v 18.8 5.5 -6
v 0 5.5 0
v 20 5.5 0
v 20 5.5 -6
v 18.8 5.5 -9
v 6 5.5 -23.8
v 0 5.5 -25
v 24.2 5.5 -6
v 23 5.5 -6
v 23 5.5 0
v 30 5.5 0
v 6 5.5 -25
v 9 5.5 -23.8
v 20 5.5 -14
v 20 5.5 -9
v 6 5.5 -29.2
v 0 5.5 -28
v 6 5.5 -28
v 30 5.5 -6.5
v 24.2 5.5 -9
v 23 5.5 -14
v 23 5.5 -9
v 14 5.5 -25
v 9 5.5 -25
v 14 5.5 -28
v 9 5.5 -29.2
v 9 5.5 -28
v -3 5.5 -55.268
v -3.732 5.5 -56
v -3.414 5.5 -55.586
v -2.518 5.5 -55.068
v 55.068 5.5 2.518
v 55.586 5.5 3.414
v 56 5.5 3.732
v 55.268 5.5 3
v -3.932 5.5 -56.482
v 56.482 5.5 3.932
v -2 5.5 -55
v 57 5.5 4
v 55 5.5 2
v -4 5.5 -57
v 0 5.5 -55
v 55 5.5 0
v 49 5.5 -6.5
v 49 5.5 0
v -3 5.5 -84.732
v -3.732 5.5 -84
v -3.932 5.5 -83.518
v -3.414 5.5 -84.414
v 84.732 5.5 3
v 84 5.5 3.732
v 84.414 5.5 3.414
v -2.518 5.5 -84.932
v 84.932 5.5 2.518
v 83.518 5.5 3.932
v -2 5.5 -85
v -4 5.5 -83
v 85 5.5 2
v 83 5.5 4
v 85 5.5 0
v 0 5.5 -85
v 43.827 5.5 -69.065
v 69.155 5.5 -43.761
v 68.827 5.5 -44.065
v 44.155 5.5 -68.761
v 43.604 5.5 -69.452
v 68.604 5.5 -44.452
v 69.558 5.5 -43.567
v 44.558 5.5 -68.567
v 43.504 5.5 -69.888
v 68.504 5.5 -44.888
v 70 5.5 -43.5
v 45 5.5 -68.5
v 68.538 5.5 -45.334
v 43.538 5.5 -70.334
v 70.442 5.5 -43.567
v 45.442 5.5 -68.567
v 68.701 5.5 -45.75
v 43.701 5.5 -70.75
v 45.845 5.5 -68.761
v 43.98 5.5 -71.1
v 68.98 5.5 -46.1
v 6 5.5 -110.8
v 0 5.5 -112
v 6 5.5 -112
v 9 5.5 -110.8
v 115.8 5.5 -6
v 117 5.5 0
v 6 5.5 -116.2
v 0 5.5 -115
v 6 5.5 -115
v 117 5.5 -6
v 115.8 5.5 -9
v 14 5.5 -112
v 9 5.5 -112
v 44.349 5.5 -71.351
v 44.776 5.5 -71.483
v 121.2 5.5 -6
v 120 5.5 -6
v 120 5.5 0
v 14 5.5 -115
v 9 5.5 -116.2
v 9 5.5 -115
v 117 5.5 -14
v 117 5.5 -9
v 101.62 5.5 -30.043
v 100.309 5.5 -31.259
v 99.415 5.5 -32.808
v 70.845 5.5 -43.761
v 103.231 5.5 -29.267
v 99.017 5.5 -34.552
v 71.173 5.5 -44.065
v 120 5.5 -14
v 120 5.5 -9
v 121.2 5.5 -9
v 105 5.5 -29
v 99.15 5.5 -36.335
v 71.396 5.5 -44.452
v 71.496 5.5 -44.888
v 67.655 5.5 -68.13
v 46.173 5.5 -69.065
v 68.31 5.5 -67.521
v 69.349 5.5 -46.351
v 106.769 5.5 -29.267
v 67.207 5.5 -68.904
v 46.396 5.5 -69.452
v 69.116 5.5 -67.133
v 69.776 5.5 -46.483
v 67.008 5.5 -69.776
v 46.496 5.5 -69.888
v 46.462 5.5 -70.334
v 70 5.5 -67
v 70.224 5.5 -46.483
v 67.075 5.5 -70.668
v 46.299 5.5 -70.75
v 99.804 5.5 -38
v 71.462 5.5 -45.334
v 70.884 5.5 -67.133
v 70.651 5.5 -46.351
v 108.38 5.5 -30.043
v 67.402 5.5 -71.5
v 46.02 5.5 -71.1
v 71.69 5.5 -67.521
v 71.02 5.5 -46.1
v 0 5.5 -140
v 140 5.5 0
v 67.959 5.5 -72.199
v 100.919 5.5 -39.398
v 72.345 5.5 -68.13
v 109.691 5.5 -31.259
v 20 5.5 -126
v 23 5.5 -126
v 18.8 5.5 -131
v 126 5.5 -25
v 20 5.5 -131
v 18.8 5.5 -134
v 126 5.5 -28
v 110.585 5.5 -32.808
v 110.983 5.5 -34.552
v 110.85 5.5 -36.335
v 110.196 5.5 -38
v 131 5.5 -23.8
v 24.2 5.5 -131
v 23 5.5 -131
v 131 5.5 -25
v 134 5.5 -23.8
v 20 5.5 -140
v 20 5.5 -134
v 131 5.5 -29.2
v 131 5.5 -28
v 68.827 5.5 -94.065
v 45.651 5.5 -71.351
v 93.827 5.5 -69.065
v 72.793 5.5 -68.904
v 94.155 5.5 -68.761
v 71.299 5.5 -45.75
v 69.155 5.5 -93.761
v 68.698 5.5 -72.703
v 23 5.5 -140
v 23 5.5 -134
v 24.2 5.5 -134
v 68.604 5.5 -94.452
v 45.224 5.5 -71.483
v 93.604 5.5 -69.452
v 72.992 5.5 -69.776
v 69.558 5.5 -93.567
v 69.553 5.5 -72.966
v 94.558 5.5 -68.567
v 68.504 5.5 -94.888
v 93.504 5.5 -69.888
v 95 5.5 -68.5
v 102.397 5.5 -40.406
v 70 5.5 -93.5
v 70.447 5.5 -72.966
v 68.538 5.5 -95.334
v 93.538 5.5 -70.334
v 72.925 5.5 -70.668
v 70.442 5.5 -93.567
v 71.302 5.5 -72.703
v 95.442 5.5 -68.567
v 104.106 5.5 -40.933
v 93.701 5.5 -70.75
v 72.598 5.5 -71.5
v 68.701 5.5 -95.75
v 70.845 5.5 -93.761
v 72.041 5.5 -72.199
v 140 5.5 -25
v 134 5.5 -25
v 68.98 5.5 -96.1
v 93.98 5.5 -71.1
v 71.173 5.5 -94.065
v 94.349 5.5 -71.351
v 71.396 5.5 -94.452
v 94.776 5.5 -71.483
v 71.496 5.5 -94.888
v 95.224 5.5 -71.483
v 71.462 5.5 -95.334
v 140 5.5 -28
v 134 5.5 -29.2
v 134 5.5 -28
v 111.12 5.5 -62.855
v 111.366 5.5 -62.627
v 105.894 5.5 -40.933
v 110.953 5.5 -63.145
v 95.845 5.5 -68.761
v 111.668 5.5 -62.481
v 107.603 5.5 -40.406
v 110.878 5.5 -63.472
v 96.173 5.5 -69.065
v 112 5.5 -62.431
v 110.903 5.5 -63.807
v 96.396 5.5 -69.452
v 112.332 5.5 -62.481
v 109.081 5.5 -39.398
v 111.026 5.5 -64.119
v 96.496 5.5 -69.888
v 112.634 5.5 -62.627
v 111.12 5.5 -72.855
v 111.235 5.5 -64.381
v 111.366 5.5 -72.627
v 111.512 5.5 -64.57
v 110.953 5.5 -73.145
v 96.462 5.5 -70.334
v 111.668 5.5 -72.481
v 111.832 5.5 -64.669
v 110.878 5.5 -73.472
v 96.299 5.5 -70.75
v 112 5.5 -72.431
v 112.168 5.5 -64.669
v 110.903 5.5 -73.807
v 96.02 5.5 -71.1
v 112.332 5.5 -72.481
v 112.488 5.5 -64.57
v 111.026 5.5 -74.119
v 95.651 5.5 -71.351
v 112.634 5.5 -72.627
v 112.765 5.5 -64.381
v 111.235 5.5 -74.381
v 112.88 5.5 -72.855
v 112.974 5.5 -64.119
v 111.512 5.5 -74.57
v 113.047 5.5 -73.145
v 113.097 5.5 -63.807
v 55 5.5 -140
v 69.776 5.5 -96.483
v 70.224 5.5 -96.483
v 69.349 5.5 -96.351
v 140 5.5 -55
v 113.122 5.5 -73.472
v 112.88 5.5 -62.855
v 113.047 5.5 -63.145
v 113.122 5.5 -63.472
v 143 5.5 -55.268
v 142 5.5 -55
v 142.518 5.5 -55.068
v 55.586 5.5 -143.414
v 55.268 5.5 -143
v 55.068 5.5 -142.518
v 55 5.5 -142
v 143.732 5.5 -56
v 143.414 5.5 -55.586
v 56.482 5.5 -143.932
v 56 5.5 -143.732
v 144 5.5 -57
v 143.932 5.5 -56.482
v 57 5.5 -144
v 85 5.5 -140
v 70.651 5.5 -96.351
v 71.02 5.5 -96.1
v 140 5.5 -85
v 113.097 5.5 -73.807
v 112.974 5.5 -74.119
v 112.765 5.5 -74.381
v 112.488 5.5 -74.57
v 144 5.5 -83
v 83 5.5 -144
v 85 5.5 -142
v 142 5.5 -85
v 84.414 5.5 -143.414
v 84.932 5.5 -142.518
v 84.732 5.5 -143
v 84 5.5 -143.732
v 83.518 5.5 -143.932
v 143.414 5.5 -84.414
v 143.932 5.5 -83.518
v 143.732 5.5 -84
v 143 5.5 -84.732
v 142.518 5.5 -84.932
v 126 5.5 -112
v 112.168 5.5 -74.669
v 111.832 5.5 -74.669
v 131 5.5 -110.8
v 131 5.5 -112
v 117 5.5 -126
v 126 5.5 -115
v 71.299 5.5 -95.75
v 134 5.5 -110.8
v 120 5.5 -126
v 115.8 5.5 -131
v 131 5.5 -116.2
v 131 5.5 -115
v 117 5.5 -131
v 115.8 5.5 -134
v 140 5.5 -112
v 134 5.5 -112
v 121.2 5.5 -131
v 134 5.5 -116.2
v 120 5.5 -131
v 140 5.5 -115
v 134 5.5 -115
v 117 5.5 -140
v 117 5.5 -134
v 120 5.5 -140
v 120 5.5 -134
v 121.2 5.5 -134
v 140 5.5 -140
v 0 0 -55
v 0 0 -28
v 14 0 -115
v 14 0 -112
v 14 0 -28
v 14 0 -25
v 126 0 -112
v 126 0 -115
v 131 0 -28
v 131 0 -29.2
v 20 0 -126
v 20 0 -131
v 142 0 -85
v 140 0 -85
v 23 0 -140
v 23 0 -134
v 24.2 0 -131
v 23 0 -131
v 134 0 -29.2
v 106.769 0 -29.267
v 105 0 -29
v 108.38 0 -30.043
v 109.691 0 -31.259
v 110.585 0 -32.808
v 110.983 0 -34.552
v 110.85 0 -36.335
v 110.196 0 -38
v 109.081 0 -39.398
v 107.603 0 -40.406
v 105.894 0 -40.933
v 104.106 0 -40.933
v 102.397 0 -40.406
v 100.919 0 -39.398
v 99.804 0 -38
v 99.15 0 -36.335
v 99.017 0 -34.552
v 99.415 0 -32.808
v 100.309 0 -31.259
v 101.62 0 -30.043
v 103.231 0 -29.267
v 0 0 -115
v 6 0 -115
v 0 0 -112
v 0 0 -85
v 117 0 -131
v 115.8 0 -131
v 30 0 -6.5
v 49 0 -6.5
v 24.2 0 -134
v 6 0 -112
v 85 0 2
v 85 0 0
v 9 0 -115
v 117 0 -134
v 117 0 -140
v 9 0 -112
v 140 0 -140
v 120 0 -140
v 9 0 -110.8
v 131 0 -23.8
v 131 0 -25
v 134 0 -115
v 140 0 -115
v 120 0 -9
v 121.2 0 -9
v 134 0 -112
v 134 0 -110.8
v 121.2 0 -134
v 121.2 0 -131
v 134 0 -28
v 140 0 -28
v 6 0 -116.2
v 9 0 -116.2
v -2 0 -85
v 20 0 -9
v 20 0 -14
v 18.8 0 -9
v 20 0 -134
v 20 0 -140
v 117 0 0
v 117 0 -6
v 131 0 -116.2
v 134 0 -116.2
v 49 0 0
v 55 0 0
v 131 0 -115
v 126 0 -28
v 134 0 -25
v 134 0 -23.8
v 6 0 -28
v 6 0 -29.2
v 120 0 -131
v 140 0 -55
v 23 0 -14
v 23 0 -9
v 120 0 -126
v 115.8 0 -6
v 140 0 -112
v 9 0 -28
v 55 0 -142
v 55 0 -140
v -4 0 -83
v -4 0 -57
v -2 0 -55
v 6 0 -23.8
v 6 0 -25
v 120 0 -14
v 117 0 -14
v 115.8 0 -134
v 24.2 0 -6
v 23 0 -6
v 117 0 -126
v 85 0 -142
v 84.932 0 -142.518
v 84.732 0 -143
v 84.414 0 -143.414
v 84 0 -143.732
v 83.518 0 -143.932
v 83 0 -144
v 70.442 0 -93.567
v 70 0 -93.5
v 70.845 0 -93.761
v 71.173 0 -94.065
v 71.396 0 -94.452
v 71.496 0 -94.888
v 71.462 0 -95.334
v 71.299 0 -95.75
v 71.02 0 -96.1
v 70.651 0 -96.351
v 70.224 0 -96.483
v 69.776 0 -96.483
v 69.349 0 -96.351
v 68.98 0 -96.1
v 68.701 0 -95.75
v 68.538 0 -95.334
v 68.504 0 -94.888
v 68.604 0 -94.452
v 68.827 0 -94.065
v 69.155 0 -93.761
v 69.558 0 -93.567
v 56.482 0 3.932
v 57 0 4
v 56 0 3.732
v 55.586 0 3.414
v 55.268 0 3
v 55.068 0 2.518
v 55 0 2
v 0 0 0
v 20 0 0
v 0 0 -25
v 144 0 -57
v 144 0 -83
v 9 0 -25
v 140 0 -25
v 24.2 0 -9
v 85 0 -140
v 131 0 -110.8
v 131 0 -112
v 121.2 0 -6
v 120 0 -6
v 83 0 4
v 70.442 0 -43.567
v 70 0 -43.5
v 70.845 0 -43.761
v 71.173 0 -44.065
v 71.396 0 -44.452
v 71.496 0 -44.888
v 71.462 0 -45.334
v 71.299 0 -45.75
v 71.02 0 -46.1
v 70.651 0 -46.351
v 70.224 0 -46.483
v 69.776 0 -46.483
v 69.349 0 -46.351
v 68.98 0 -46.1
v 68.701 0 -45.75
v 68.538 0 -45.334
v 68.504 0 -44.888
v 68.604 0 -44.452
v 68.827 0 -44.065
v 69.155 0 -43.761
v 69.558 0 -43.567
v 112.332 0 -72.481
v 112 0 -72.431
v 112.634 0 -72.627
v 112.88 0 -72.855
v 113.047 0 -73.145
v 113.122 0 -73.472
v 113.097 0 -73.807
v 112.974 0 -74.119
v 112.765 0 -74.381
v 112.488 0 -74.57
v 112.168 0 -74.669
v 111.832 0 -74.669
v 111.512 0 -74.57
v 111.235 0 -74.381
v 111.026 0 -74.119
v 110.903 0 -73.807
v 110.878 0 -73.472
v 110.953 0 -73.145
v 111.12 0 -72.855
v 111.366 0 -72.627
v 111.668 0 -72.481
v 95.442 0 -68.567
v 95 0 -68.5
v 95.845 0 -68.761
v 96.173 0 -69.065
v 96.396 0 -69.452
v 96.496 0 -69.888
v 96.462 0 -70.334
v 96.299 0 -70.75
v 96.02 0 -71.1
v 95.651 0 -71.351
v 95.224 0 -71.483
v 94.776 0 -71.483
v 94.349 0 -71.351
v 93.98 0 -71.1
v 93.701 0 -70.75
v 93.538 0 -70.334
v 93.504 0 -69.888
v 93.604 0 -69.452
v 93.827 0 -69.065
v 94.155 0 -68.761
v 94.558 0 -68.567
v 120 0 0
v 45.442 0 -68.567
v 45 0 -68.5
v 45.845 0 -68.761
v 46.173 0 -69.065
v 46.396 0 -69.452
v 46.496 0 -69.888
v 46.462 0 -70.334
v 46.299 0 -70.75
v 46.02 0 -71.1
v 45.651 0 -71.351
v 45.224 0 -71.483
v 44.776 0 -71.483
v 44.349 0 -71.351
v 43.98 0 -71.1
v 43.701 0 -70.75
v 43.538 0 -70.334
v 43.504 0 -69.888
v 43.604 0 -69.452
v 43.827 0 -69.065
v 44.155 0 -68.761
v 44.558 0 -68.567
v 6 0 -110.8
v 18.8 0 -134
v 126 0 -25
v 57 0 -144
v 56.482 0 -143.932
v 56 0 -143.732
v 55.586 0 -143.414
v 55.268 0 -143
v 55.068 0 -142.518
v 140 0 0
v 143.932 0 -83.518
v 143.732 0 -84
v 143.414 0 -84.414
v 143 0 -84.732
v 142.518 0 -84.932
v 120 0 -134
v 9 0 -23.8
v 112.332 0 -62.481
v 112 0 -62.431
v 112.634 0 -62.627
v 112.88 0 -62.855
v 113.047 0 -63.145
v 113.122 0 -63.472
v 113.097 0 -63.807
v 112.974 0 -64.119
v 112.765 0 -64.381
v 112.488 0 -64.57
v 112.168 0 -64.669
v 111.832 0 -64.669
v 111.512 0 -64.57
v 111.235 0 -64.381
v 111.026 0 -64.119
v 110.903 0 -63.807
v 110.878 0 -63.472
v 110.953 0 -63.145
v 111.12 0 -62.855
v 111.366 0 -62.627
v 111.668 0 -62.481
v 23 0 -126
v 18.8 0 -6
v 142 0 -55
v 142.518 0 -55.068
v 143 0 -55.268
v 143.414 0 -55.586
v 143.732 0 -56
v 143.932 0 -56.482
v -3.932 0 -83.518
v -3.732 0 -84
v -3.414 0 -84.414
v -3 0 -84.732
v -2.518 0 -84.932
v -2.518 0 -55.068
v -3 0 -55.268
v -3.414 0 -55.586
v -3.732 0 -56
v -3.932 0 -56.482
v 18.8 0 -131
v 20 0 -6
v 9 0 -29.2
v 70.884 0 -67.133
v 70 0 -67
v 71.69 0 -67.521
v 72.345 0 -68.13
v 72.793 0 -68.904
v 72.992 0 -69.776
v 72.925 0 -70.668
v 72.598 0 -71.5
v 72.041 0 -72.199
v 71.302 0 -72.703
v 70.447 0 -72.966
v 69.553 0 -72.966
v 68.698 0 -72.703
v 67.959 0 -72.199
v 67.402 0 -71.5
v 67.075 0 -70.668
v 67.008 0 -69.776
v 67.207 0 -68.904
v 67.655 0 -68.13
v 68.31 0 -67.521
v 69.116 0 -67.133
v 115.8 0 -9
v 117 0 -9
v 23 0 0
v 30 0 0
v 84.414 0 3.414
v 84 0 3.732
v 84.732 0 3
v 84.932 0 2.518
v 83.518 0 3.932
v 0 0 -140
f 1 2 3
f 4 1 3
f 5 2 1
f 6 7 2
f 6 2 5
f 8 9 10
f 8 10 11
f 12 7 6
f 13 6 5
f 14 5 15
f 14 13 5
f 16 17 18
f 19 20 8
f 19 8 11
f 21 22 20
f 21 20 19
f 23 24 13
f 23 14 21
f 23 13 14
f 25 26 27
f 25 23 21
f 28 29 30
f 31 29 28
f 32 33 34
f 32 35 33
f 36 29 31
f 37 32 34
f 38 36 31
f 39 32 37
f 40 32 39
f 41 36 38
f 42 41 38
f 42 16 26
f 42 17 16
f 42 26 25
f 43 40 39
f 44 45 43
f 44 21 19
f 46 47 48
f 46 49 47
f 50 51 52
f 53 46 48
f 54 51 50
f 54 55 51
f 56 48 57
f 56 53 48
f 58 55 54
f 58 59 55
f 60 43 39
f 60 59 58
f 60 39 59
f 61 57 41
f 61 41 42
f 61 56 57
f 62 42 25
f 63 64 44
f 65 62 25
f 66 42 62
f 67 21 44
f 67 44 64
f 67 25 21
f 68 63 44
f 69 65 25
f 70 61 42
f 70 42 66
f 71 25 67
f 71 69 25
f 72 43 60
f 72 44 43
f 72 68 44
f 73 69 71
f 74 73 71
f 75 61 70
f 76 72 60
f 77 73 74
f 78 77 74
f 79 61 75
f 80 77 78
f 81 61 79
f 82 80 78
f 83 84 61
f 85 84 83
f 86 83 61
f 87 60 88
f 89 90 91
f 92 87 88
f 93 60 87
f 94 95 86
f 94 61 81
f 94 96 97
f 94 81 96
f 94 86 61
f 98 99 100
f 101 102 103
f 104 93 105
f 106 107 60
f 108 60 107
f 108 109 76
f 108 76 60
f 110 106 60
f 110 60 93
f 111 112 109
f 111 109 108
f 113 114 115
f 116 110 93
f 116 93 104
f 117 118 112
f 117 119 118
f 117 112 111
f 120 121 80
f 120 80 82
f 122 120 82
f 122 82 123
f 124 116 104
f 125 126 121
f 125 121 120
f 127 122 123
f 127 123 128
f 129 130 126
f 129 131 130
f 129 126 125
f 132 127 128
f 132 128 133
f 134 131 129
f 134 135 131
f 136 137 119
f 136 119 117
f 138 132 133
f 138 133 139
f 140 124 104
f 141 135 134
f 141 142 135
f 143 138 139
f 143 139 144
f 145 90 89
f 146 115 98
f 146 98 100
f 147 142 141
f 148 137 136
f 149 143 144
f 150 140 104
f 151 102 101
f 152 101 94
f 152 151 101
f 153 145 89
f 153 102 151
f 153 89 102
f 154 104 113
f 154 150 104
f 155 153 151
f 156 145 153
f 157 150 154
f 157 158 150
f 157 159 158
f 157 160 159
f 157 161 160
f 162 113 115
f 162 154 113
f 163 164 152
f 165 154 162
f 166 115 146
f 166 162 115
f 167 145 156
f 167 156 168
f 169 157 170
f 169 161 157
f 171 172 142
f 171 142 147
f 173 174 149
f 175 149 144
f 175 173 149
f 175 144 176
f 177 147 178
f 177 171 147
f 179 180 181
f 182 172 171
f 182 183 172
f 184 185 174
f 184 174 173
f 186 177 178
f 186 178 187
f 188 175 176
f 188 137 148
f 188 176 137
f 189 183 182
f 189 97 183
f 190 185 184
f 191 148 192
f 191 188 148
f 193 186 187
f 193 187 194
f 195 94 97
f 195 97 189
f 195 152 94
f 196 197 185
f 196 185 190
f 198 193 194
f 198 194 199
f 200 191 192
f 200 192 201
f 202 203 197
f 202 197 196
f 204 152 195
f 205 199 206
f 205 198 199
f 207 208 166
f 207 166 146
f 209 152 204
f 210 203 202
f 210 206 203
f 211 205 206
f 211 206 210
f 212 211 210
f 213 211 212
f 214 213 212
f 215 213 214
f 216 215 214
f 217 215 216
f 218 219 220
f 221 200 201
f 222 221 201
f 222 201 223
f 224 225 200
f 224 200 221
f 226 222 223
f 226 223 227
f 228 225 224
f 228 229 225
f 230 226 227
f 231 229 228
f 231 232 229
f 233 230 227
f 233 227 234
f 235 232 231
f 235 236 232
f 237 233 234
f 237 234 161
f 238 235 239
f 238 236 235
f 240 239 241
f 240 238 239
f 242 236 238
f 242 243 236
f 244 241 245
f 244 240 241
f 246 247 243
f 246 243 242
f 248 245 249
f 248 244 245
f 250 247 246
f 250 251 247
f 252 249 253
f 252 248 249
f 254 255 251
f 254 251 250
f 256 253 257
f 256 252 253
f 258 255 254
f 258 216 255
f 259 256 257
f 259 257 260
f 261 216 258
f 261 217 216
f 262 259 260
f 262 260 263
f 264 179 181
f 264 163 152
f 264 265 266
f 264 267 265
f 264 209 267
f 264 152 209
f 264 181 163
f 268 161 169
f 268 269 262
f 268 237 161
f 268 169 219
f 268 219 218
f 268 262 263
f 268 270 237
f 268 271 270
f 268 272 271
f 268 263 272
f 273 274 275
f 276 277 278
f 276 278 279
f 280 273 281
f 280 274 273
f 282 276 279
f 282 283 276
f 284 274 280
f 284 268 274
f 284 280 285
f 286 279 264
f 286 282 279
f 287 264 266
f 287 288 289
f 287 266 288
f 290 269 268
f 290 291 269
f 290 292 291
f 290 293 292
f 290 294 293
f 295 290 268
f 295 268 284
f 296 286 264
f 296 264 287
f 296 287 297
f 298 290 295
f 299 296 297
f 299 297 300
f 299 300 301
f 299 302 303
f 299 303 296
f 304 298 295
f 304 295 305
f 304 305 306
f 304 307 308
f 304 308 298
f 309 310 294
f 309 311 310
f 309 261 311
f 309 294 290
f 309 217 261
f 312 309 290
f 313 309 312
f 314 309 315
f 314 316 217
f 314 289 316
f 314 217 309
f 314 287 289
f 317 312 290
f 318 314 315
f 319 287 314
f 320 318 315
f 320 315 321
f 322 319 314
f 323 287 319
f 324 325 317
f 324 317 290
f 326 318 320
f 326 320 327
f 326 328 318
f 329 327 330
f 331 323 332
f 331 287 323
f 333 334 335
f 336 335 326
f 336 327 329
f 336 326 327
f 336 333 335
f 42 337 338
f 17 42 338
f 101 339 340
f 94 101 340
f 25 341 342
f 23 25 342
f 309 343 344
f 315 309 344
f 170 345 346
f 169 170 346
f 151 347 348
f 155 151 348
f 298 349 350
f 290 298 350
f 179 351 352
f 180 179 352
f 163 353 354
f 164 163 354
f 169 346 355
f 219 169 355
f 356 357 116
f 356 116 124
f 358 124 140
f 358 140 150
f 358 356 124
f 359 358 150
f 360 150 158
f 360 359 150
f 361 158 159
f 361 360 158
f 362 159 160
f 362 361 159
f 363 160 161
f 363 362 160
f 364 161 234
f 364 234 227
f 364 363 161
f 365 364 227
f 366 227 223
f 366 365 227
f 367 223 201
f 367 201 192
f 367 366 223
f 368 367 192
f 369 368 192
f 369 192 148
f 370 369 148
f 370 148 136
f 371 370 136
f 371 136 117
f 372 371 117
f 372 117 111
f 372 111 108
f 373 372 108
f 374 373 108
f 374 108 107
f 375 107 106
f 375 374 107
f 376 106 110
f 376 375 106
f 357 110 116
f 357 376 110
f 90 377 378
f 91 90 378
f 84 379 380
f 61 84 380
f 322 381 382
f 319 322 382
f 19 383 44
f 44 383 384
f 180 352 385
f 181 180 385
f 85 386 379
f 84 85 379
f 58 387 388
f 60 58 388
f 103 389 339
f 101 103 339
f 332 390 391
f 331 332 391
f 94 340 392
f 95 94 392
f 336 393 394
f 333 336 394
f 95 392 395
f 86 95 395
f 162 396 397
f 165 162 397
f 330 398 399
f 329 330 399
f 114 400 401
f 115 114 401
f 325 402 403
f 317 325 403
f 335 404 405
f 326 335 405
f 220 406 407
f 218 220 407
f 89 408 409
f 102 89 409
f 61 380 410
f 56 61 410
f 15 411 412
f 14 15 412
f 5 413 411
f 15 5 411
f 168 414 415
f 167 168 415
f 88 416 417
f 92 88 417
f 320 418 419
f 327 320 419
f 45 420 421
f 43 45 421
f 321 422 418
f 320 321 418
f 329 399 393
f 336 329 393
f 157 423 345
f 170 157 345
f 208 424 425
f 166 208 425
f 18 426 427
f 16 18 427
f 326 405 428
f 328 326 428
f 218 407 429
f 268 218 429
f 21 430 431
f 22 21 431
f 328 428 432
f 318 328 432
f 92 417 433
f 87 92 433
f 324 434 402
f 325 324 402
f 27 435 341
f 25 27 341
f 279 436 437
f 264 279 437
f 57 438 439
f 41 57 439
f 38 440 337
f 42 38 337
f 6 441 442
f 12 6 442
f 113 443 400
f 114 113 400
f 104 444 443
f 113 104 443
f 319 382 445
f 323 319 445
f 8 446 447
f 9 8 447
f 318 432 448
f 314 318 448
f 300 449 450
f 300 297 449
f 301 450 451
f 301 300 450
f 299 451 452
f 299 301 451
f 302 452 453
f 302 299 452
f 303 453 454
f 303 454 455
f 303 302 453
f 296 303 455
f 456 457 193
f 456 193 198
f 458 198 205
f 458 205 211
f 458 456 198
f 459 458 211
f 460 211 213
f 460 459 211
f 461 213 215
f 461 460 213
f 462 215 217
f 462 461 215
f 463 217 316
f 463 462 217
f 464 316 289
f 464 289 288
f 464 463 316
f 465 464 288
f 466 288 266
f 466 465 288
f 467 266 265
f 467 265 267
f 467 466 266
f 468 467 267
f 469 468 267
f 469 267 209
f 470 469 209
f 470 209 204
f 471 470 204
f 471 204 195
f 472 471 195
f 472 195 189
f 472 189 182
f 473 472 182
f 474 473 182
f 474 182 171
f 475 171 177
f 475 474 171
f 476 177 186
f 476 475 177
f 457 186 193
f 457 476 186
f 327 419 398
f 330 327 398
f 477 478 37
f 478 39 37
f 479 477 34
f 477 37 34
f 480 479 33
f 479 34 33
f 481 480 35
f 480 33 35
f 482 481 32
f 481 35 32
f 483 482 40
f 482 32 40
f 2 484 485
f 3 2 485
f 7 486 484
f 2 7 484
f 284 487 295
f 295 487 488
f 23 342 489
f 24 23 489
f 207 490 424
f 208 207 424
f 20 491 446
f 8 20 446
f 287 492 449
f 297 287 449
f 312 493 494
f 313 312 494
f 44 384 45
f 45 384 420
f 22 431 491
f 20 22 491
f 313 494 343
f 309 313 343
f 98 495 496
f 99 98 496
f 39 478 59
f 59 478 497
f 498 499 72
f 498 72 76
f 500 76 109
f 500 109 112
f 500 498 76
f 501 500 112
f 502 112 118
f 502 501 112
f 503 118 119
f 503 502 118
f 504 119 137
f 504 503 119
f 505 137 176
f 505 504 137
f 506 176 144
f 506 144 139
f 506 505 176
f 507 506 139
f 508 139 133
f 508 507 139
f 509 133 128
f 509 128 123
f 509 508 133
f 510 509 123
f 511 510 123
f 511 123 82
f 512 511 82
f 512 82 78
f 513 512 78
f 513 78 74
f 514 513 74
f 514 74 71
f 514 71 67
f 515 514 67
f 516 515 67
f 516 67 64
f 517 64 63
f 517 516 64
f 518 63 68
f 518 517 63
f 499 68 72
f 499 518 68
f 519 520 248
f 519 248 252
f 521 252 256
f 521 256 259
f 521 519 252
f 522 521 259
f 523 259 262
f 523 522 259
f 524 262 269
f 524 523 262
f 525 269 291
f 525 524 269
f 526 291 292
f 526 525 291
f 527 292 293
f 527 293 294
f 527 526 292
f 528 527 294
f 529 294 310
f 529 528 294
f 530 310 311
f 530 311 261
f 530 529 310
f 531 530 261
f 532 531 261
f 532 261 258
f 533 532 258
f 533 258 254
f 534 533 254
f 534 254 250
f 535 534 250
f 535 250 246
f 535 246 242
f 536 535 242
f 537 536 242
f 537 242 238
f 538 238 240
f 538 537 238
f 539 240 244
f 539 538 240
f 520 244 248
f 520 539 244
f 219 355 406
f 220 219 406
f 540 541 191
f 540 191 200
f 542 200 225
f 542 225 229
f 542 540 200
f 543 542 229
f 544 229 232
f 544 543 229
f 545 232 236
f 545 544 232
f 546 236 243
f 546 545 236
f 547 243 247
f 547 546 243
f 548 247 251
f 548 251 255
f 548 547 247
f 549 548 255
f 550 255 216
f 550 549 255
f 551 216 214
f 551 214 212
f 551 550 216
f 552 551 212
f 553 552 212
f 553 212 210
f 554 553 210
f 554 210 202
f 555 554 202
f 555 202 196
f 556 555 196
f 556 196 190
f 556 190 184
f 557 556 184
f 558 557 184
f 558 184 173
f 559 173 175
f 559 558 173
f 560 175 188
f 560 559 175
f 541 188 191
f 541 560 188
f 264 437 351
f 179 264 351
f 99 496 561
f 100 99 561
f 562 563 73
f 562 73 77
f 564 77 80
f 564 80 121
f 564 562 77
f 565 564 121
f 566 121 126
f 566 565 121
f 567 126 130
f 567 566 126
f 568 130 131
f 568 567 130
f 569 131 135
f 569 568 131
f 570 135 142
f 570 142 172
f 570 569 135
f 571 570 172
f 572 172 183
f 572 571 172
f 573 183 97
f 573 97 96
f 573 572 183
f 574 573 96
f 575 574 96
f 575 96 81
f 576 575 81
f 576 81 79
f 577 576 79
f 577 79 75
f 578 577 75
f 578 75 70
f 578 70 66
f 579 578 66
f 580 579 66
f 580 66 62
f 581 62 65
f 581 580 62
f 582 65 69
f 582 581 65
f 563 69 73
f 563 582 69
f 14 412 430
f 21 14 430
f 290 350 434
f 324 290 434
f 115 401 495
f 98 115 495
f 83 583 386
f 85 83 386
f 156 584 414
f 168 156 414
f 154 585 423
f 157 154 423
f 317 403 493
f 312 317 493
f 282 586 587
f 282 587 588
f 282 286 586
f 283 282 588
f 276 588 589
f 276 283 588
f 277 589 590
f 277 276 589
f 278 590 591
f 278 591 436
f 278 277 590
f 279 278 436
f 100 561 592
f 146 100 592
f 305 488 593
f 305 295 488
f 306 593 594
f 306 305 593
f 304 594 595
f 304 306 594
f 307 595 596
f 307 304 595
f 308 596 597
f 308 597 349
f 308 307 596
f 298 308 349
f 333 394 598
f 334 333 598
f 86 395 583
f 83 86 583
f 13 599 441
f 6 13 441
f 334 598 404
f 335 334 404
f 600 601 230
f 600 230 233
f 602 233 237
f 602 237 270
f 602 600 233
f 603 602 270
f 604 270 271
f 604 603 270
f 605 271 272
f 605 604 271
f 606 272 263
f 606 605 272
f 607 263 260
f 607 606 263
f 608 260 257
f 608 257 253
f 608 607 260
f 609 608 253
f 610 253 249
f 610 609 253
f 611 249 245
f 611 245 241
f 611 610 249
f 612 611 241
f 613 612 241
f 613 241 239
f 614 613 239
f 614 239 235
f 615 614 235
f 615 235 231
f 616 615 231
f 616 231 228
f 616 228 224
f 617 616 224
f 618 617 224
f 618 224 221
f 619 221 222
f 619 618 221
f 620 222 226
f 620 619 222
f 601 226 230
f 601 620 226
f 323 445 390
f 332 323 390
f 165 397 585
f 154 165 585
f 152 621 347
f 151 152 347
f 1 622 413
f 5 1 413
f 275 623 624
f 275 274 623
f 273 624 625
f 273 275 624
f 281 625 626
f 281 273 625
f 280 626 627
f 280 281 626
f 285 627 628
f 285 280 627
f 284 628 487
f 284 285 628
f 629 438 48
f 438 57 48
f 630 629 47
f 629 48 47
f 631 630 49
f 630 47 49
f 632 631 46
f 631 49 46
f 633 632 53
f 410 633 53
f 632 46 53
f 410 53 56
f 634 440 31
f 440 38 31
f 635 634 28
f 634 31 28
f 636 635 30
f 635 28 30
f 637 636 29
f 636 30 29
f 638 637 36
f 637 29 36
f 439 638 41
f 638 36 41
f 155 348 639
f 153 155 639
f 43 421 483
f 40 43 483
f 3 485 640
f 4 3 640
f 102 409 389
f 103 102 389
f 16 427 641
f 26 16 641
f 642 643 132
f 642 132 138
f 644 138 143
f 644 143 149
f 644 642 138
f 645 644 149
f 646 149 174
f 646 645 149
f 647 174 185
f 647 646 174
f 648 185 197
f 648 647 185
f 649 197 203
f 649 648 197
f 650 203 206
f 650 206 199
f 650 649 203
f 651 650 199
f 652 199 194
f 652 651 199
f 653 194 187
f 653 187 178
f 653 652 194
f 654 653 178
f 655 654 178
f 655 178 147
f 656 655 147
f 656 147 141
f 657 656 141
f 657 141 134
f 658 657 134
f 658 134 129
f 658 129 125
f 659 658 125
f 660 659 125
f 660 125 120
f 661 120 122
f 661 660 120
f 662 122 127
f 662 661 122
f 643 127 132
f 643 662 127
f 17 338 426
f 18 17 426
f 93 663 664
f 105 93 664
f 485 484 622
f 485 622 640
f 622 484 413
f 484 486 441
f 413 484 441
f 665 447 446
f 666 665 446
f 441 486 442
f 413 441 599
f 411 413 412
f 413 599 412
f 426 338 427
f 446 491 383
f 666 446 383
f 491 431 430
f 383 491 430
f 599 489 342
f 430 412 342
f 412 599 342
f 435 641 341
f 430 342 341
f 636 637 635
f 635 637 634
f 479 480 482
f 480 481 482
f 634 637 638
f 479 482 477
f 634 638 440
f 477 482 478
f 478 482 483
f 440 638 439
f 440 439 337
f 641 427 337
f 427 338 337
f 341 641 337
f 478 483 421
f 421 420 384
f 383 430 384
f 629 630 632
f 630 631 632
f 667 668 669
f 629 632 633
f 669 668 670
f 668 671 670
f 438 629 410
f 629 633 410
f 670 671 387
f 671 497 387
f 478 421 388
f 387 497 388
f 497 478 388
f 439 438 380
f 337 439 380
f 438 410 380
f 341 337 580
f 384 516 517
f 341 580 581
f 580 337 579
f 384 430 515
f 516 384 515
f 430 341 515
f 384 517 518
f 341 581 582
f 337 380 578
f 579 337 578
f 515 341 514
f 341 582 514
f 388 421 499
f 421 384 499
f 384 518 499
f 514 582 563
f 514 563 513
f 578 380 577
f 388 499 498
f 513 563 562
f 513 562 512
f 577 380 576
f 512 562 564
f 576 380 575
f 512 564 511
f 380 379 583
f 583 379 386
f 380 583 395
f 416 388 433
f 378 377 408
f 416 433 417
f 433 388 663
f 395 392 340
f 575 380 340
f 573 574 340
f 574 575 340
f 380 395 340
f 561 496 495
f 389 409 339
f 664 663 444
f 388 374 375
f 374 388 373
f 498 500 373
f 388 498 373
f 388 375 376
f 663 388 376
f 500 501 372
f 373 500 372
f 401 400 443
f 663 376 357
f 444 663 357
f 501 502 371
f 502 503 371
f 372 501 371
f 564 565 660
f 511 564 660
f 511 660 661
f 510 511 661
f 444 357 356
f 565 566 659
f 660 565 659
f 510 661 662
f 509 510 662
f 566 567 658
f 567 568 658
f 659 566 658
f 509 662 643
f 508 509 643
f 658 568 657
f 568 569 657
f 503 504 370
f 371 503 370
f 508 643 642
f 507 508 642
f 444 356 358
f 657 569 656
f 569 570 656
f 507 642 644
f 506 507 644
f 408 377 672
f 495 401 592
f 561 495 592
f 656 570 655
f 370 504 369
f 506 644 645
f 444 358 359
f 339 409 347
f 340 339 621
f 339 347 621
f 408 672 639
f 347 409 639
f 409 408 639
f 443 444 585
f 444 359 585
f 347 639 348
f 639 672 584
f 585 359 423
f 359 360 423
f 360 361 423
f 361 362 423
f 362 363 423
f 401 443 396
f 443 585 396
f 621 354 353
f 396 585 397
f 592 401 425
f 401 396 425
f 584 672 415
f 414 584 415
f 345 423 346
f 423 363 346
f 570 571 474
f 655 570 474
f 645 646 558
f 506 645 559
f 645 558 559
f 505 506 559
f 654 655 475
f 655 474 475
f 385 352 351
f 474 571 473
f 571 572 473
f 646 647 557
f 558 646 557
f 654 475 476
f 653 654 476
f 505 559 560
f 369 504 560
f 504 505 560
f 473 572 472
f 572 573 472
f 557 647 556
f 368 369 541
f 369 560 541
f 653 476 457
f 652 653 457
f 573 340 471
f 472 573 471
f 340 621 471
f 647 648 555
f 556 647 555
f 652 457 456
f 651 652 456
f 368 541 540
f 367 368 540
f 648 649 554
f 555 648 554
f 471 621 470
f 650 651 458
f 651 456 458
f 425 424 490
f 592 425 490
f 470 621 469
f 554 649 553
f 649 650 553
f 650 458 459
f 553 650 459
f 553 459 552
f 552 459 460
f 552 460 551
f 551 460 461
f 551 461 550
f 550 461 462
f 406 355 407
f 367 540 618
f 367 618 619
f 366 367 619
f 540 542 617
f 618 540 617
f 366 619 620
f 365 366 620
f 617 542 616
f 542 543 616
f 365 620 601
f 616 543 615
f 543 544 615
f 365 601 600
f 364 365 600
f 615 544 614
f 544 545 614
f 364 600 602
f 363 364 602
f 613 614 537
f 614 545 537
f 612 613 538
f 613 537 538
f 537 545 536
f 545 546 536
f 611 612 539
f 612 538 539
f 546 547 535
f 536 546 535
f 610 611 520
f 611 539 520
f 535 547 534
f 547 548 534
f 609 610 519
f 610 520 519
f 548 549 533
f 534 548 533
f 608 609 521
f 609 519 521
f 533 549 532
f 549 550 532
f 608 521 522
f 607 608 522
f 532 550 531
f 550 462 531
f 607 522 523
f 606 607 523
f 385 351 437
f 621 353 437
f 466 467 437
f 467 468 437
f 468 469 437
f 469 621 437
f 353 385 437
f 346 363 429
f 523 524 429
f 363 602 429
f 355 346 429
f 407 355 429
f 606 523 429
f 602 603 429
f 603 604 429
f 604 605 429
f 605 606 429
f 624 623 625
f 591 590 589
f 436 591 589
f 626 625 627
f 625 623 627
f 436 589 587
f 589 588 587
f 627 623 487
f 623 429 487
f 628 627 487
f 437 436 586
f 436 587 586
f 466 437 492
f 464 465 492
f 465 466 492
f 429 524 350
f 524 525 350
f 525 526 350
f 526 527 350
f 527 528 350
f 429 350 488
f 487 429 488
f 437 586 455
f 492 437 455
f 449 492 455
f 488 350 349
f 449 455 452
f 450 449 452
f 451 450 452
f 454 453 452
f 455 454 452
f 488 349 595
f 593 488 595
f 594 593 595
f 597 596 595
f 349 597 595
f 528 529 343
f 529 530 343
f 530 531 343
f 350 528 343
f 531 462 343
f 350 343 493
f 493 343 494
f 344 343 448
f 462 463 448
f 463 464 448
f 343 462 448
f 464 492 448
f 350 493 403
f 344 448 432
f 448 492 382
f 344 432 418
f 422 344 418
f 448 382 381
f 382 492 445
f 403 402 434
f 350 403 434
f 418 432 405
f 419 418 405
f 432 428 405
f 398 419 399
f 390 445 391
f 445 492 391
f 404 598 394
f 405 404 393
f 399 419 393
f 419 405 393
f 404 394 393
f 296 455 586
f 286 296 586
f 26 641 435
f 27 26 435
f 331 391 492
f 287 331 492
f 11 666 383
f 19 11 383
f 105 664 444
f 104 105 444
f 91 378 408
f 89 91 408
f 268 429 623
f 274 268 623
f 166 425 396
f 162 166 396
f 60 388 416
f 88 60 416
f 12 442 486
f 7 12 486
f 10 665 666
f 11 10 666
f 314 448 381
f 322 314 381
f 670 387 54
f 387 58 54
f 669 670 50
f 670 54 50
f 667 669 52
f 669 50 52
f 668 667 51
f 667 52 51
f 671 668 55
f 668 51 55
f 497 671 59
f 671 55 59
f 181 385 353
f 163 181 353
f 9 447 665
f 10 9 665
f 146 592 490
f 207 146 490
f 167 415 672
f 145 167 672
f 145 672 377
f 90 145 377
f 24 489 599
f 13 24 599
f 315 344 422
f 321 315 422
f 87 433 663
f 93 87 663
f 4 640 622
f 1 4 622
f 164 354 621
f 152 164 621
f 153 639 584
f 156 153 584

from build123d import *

# Parameters (mm, degrees)
SKETCH1_R           = 3
SKETCH1_R_2         = 1.5
SKETCH1_R_3         = 6
SKETCH1_R_4         = 1.125
BOSS_EXTRUDE1_DEPTH = 5.5
FILLET1_R           = 2


with BuildPart() as part:
    # Sketch1 → Boss-Extrude1 (new body)
    with BuildSketch(Plane(origin=(0, 0, 0), x_dir=(1, 0, 0), z_dir=(0, 1, 0))):
        Polygon((85, 0), (117, 0), (117, 6), (115.8, 6), (115.8, 9), (117, 9), (117, 14), (120, 14), (120, 9), (121.2, 9), (121.2, 6), (120, 6), (120, 0), (140, 0), (140, 25), (134, 25), (134, 23.8), (131, 23.8), (131, 25), (126, 25), (126, 28), (131, 28), (131, 29.2), (134, 29.2), (134, 28), (140, 28), (140, 55), (144, 55), (144, 85), (140, 85), (140, 112), (134, 112), (134, 110.8), (131, 110.8), (131, 112), (126, 112), (126, 115), (131, 115), (131, 116.2), (134, 116.2), (134, 115), (140, 115), (140, 140), (120, 140), (120, 134), (121.2, 134), (121.2, 131), (120, 131), (120, 126), (117, 126), (117, 131), (115.8, 131), (115.8, 134), (117, 134), (117, 140), (85, 140), (85, 144), (55, 144), (55, 140), (23, 140), (23, 134), (24.2, 134), (24.2, 131), (23, 131), (23, 126), (20, 126), (20, 131), (18.8, 131), (18.8, 134), (20, 134), (20, 140), (0, 140), (0, 115), (6, 115), (6, 116.2), (9, 116.2), (9, 115), (14, 115), (14, 112), (9, 112), (9, 110.8), (6, 110.8), (6, 112), (0, 112), (0, 85), (-4, 85), (-4, 55), (0, 55), (0, 28), (6, 28), (6, 29.2), (9, 29.2), (9, 28), (14, 28), (14, 25), (9, 25), (9, 23.8), (6, 23.8), (6, 25), (0, 25), (0, 0), (20, 0), (20, 6), (18.8, 6), (18.8, 9), (20, 9), (20, 14), (23, 14), (23, 9), (24.2, 9), (24.2, 6), (23, 6), (23, 0), (30, 0), (30, 6.5), (49, 6.5), (49, 0), (55, 0), (55, -4), (85, -4), align=None)
        with Locations(Location((70, 70, 0), (0, 0, 270))):
            Circle(SKETCH1_R, mode=Mode.SUBTRACT)
        with Locations(Location((70, 95, 0), (0, 0, 270))):
            Circle(SKETCH1_R_2, mode=Mode.SUBTRACT)
        with Locations(Location((95, 70, 0), (0, 0, 270))):
            Circle(SKETCH1_R_2, mode=Mode.SUBTRACT)
        with Locations(Location((70, 45, 0), (0, 0, 270))):
            Circle(SKETCH1_R_2, mode=Mode.SUBTRACT)
        with Locations(Location((45, 70, 0), (0, 0, 270))):
            Circle(SKETCH1_R_2, mode=Mode.SUBTRACT)
        with Locations(Location((105, 35, 0), (0, 0, 270))):
            Circle(SKETCH1_R_3, mode=Mode.SUBTRACT)
        with Locations(Location((112, 73.556484563, 0), (0, 0, 270))):
            Circle(SKETCH1_R_4, mode=Mode.SUBTRACT)
        with Locations(Location((112, 63.556484563, 0), (0, 0, 270))):
            Circle(SKETCH1_R_4, mode=Mode.SUBTRACT)
    extrude(amount=BOSS_EXTRUDE1_DEPTH)

    # Fillet1
    fillet1_edges = [part.edges().sort_by_distance(p)[0] for p in [
        (-4, 2.75, -55),
        (-4, 2.75, -85),
        (55, 2.75, -144),
        (85, 2.75, -144),
        (144, 2.75, -85),
        (144, 2.75, -55),
        (85, 2.75, 4),
        (55, 2.75, 4),
    ]]
    fillet(fillet1_edges, radius=FILLET1_R)


solid = part.part
